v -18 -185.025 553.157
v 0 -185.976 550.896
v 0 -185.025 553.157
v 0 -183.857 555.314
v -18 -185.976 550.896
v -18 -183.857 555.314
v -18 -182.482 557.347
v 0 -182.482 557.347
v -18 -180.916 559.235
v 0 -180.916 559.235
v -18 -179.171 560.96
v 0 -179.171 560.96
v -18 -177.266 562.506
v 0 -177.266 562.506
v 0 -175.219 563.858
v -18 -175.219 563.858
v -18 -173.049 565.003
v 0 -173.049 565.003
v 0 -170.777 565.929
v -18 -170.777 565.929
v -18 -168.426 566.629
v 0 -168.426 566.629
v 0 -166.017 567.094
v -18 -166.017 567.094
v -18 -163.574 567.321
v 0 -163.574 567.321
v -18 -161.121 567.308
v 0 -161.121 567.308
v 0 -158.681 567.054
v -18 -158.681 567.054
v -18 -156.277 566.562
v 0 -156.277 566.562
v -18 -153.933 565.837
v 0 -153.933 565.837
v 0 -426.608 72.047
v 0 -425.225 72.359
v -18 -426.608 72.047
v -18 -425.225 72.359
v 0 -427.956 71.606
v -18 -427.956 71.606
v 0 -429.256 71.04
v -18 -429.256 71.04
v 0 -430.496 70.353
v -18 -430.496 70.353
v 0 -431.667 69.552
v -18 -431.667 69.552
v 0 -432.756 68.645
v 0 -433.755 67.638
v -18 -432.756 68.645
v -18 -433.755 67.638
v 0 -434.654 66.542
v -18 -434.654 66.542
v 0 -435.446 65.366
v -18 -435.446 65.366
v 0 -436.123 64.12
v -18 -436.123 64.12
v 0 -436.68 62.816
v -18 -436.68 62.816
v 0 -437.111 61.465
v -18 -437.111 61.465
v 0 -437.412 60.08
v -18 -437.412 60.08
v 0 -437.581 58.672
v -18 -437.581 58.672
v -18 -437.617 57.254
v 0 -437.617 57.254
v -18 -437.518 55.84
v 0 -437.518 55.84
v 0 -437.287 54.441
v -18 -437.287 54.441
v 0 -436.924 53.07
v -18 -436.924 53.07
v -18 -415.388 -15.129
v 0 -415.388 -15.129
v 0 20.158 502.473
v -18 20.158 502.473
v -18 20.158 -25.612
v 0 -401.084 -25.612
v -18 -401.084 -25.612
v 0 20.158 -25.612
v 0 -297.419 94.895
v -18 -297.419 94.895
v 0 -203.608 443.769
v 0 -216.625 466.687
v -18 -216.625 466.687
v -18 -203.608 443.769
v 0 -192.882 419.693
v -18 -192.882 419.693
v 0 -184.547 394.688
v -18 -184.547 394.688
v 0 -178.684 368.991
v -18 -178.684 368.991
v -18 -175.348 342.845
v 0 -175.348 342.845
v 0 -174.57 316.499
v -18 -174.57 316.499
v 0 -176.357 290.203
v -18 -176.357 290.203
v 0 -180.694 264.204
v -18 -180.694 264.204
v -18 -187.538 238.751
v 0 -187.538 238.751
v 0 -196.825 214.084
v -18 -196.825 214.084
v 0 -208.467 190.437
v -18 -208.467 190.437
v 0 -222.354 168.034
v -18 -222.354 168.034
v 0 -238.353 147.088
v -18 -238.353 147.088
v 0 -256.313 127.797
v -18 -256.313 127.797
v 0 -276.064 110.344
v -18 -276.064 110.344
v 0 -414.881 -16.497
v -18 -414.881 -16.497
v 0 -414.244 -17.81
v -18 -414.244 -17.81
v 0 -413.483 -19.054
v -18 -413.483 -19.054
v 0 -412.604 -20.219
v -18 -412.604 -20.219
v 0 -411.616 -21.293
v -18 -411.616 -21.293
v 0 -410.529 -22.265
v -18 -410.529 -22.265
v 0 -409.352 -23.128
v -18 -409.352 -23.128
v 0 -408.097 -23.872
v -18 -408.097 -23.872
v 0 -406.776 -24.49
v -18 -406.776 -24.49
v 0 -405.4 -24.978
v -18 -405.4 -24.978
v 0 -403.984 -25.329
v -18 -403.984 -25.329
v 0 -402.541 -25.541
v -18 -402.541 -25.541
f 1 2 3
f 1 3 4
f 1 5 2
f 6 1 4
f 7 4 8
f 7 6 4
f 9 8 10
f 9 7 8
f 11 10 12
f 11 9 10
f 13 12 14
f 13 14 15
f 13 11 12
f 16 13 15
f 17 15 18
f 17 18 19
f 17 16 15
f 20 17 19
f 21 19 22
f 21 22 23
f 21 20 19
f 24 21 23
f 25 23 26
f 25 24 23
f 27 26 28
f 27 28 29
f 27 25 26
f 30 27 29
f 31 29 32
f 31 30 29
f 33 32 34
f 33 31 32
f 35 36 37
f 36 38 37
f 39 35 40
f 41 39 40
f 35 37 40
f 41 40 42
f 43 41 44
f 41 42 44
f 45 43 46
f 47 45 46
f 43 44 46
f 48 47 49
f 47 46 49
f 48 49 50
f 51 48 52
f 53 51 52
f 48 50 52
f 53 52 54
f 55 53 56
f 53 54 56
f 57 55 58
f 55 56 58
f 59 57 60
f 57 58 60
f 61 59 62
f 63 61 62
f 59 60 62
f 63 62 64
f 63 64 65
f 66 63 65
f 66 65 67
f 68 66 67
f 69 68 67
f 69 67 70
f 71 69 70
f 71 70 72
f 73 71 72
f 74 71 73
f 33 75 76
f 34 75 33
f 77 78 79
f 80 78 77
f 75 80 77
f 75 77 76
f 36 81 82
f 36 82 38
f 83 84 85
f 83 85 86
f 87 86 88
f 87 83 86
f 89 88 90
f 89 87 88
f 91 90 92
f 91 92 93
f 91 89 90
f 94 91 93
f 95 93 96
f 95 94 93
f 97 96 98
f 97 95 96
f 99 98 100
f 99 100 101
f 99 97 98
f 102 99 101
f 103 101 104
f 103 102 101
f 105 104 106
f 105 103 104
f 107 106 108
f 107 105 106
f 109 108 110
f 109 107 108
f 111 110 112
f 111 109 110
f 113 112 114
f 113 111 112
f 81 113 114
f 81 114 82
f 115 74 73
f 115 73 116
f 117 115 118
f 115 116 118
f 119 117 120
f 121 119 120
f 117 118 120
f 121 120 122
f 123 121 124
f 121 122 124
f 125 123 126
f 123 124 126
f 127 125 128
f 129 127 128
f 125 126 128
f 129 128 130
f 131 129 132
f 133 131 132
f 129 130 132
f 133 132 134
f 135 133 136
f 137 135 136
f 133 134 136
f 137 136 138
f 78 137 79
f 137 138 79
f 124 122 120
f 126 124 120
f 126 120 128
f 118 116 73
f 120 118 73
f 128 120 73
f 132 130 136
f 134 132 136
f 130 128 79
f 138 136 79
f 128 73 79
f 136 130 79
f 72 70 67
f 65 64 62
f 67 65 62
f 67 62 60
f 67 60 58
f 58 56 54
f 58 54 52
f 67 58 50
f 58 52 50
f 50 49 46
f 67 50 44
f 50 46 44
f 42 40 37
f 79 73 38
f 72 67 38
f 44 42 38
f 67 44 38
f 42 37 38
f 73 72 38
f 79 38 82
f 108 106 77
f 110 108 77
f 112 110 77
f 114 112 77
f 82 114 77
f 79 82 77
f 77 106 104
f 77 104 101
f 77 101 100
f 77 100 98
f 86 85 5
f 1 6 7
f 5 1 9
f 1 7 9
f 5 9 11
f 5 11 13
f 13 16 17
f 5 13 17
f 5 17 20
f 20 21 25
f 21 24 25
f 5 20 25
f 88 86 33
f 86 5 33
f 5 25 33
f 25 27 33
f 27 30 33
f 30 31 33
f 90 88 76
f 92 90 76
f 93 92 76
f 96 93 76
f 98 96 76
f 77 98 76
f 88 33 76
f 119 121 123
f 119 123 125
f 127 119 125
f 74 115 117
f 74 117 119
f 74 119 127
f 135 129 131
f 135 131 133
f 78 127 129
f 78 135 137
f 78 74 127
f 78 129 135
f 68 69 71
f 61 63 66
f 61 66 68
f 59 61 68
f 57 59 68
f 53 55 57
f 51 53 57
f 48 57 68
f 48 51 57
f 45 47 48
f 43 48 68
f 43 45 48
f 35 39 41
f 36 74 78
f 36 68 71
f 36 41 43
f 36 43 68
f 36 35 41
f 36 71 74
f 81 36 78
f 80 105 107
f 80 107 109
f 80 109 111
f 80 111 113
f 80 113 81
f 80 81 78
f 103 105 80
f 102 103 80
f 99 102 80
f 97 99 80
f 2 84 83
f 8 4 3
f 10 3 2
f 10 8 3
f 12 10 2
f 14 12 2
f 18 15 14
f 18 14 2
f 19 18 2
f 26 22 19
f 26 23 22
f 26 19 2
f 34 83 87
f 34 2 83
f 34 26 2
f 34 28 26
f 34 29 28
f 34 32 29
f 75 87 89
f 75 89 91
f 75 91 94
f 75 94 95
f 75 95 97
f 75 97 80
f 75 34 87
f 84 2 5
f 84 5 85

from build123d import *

# Parameters (mm, degrees)
F1_DEPTH = 1.8
F2_R     = 1.5
F3_R     = 2.5
F4_SCALE = 10


with BuildPart() as f1:
    # F0 (on Right) → F1 (new body)
    with BuildSketch(Plane.YZ):
        with BuildLine():
            Line((20.157673577, -25.612176564), (20.157673577, 27.1963820784))
            Line((20.157673577, 27.1963820784), (0.3993508334, 34.387823436))
            Line((0.3993508334, 34.387823436), (-3.5206237808, 23.6177816987))
            ThreePointArc((-3.5206237808, 23.6177816987), (0.0725196424, 3.3694774982), (-11.6, -13.5614642316))
            Line((-11.6, -13.5614642316), (-26.0658084777, -16.112176564))
            Line((-26.0658084777, -16.112176564), (-23.0658084777, -25.612176564))
            Line((-23.0658084777, -25.612176564), (20.157673577, -25.612176564))
        make_face()
    extrude(amount=-F1_DEPTH)

    # F2
    f2_edges = [f1.edges().sort_by_distance(p)[0] for p in [
        (-0.9, -26.065808, -16.112177),
        (-0.9, -23.065808, -25.612177),
    ]]
    fillet(f2_edges, radius=F2_R)

    # F3
    f3_edges = [f1.edges().sort_by_distance(p)[0] for p in [
        (-0.9, 0.399351, 34.387823),
    ]]
    fillet(f3_edges, radius=F3_R)


with BuildPart() as f1_1:
    # F4: moved
    add(f1.part.scale(F4_SCALE).moved(Location((0, -181.4190621927, 230.5095890756))))


solid = f1_1.part
